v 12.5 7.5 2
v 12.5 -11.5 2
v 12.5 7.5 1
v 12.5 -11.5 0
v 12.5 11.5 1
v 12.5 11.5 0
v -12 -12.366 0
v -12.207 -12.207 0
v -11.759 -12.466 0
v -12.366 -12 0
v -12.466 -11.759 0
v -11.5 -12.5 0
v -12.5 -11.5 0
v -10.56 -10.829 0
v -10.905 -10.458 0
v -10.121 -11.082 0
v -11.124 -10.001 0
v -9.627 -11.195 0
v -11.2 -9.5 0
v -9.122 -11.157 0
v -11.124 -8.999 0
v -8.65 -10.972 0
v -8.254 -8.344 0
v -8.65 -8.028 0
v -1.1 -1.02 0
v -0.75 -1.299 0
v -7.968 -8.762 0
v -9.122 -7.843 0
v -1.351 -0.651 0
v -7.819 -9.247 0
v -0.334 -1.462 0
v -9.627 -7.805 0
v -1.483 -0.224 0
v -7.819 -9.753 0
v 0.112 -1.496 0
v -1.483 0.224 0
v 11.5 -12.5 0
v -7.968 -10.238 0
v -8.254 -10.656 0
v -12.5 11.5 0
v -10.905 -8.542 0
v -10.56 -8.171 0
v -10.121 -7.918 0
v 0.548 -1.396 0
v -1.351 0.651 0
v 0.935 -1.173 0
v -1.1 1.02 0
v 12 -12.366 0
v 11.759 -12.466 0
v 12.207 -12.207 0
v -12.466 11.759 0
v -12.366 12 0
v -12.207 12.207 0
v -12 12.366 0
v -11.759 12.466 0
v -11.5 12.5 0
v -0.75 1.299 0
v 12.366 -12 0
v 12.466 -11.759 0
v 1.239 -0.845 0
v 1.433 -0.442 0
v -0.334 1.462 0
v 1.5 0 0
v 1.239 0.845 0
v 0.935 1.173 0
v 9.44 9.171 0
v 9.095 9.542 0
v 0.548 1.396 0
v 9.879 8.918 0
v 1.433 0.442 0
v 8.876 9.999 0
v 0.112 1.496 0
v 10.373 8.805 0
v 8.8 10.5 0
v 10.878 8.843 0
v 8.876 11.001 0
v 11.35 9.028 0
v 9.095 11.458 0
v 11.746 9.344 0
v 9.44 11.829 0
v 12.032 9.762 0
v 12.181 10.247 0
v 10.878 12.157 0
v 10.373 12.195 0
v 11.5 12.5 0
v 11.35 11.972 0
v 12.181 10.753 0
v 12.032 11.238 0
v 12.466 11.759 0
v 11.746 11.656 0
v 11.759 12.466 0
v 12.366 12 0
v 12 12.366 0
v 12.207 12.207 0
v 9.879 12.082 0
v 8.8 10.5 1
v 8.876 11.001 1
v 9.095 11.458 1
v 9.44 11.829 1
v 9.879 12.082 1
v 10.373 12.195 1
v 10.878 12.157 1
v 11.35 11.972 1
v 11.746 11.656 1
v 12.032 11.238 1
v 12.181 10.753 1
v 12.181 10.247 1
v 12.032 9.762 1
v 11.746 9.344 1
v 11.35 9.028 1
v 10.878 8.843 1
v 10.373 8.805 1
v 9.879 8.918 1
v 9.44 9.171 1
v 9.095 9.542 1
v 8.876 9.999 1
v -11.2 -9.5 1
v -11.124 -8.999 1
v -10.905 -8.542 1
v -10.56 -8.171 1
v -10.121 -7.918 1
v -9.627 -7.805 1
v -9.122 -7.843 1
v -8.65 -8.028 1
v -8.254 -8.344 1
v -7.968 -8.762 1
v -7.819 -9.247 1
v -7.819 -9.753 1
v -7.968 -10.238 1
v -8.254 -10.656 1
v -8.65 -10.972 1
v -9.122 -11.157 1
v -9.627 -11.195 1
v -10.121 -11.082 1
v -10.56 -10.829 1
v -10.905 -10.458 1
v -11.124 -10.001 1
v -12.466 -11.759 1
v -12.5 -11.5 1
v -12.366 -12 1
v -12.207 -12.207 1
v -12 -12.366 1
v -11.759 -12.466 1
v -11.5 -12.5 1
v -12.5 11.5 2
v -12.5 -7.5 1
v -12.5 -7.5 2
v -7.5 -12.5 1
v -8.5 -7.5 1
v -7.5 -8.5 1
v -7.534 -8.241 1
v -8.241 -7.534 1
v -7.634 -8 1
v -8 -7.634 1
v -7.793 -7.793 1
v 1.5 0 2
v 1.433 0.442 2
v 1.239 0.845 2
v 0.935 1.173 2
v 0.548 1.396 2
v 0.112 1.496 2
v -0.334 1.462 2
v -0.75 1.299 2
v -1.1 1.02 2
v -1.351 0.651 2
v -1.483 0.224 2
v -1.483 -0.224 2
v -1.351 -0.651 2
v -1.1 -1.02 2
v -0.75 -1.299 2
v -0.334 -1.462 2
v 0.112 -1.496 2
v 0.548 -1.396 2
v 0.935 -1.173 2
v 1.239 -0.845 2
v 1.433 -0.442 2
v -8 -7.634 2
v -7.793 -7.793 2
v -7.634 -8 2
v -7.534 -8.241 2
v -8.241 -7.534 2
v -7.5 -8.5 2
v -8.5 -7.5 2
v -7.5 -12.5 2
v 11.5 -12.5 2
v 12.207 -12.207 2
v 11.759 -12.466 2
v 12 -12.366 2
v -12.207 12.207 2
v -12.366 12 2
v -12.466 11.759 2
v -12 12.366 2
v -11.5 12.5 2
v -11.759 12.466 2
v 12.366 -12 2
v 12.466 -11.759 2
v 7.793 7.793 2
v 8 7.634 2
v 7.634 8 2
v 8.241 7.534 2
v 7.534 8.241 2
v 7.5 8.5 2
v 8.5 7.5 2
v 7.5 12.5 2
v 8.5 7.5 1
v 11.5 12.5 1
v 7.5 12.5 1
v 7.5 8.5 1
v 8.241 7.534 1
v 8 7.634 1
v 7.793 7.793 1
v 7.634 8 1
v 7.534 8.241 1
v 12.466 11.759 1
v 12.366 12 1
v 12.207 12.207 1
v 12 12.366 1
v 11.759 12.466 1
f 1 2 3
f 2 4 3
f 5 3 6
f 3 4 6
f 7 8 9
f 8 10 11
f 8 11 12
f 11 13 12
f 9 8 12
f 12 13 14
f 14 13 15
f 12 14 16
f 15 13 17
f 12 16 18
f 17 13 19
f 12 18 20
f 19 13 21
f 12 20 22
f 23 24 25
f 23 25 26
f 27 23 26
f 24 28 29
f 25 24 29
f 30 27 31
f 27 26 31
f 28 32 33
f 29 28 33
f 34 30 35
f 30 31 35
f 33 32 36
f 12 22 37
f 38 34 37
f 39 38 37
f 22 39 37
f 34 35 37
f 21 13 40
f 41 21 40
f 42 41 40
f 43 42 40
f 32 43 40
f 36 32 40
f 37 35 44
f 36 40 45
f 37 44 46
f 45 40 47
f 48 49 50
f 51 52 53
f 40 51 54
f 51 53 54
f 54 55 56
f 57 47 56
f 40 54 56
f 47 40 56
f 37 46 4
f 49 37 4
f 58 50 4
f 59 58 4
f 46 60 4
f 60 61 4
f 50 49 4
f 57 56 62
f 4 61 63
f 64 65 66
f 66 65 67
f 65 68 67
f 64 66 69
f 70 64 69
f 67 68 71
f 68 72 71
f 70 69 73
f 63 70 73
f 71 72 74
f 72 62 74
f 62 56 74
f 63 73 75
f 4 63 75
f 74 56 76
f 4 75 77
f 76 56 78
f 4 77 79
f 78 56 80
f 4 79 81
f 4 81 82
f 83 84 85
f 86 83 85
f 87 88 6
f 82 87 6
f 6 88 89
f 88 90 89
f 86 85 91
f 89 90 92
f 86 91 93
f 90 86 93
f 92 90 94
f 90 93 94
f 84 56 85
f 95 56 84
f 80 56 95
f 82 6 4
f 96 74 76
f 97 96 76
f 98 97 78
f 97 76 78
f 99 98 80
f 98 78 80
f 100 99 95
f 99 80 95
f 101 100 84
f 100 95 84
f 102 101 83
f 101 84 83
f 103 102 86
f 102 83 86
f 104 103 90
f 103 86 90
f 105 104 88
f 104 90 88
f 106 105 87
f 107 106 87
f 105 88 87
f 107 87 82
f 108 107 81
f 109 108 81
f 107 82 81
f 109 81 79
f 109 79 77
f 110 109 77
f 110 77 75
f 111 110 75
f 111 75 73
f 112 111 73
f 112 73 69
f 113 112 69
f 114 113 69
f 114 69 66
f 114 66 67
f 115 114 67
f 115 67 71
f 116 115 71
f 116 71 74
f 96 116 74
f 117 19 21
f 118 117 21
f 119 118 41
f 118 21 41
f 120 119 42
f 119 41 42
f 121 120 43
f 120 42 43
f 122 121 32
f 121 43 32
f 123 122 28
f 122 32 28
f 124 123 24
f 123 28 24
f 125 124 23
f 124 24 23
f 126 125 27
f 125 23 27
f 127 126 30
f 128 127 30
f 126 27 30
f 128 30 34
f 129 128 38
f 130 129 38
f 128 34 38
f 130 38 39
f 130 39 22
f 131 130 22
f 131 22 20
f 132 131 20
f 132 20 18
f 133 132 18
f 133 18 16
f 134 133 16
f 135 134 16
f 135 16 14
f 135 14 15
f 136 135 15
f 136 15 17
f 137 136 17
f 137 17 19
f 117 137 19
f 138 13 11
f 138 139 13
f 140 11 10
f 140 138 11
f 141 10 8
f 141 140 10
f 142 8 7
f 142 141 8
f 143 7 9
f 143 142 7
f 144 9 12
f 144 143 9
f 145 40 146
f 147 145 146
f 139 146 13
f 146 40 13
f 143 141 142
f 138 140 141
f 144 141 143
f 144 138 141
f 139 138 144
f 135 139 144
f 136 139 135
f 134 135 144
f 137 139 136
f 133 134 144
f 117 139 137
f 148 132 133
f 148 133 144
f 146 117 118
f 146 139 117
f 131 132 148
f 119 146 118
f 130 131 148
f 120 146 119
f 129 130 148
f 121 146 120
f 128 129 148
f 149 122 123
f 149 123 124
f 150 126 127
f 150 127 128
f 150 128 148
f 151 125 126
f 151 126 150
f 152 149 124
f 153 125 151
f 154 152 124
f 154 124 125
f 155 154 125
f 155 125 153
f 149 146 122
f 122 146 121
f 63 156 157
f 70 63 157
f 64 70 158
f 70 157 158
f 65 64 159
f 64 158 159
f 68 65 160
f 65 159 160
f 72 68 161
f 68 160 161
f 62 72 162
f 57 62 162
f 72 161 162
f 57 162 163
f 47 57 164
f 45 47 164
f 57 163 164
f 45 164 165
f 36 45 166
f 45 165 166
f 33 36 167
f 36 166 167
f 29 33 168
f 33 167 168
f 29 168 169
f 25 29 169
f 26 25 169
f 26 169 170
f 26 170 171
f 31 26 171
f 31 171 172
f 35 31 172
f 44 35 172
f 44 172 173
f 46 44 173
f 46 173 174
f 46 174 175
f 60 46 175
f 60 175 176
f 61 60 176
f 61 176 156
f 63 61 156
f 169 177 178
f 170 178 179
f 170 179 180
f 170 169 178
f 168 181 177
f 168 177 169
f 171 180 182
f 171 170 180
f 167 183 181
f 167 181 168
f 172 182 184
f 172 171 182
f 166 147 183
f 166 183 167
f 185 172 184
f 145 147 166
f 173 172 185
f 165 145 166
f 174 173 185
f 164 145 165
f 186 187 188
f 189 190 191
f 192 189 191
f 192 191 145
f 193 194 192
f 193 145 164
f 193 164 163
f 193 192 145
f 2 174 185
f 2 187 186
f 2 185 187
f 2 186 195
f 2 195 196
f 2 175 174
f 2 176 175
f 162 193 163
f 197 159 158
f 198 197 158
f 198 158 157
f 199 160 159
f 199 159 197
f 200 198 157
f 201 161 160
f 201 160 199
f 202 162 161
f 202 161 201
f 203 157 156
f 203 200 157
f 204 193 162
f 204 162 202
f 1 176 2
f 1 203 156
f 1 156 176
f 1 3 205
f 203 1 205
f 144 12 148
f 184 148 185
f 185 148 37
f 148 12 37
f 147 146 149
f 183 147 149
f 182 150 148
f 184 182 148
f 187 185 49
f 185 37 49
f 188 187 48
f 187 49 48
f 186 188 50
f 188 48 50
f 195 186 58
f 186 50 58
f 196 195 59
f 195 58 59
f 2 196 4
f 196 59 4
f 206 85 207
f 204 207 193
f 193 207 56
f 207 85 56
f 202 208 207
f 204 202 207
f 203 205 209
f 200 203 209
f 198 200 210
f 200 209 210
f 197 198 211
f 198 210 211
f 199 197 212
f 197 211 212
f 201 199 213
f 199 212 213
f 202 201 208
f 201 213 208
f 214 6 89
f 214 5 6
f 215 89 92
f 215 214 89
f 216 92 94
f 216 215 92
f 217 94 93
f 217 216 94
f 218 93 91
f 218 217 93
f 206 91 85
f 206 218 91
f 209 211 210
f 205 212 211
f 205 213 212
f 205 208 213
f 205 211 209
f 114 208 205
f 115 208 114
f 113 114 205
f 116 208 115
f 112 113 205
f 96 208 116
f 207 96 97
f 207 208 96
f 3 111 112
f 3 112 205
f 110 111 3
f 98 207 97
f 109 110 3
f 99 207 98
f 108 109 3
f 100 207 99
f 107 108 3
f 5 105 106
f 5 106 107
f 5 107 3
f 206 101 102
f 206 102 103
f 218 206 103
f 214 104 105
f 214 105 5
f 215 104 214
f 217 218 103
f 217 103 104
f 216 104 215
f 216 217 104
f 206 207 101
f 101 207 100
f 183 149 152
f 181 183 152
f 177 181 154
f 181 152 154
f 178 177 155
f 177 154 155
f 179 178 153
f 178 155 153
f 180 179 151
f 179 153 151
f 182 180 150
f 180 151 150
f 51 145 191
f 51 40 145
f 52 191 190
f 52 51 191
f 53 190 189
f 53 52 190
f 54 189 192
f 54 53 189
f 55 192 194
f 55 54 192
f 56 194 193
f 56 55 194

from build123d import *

# Parameters (mm, degrees)
SKETCH1_W            = 25
SKETCH1_H            = 25
BOSS_EXTRUDE1_DEPTH  = 1
BOSS_EXTRUDE2_DEPTH  = 2
FILLET1_R            = 1
SKETCH2_R            = 1.5
CUT_EXTRUDE1_DEPTH   = 18.790446875
M3_CLEARANCE_HOLE1_D = 3.4


with BuildPart() as part:
    # Sketch1 → Boss-Extrude1 (new body)
    with BuildSketch(Plane.XY):
        Rectangle(SKETCH1_W, SKETCH1_H)
    extrude(amount=BOSS_EXTRUDE1_DEPTH)

    # Sketch1<3> → Boss-Extrude2 (add)
    with BuildSketch(Plane.XY):
        with BuildLine():
            Line((7.5, 8.5), (7.5, 12.5))
            Line((7.5, 12.5), (-12.5, 12.5))
            Line((-12.5, 12.5), (-12.5, -7.5))
            Line((-12.5, -7.5), (-8.5, -7.5))
            ThreePointArc((-8.5, -7.5), (-7.792893219, -7.792893219), (-7.5, -8.5))
            Line((-7.5, -8.5), (-7.5, -12.5))
            Line((-7.5, -12.5), (12.5, -12.5))
            Line((12.5, -12.5), (12.5, 7.5))
            Line((12.5, 7.5), (8.5, 7.5))
            ThreePointArc((8.5, 7.5), (7.792893219, 7.792893219), (7.5, 8.5))
        make_face()
    extrude(amount=BOSS_EXTRUDE2_DEPTH)

    # Fillet1
    fillet1_edges = [part.edges().sort_by_distance(p)[0] for p in [
        (12.5, -12.5, 1),
        (-12.5, -12.5, 0.5),
        (-12.5, 12.5, 1),
        (12.5, 12.5, 0.5),
    ]]
    fillet(fillet1_edges, radius=FILLET1_R)

    # Sketch2 → Cut-Extrude1 (cut, through all)
    with BuildSketch(Plane.XY.offset(2)):
        Circle(SKETCH2_R)
    extrude(amount=-CUT_EXTRUDE1_DEPTH, mode=Mode.SUBTRACT)

    # M3 Clearance Hole1 (through all)
    with Locations(Plane.XY.offset(1)):
        with Locations((10.5, 10.5), (-9.5, -9.5)):
            Hole(M3_CLEARANCE_HOLE1_D / 2)


solid = part.part
